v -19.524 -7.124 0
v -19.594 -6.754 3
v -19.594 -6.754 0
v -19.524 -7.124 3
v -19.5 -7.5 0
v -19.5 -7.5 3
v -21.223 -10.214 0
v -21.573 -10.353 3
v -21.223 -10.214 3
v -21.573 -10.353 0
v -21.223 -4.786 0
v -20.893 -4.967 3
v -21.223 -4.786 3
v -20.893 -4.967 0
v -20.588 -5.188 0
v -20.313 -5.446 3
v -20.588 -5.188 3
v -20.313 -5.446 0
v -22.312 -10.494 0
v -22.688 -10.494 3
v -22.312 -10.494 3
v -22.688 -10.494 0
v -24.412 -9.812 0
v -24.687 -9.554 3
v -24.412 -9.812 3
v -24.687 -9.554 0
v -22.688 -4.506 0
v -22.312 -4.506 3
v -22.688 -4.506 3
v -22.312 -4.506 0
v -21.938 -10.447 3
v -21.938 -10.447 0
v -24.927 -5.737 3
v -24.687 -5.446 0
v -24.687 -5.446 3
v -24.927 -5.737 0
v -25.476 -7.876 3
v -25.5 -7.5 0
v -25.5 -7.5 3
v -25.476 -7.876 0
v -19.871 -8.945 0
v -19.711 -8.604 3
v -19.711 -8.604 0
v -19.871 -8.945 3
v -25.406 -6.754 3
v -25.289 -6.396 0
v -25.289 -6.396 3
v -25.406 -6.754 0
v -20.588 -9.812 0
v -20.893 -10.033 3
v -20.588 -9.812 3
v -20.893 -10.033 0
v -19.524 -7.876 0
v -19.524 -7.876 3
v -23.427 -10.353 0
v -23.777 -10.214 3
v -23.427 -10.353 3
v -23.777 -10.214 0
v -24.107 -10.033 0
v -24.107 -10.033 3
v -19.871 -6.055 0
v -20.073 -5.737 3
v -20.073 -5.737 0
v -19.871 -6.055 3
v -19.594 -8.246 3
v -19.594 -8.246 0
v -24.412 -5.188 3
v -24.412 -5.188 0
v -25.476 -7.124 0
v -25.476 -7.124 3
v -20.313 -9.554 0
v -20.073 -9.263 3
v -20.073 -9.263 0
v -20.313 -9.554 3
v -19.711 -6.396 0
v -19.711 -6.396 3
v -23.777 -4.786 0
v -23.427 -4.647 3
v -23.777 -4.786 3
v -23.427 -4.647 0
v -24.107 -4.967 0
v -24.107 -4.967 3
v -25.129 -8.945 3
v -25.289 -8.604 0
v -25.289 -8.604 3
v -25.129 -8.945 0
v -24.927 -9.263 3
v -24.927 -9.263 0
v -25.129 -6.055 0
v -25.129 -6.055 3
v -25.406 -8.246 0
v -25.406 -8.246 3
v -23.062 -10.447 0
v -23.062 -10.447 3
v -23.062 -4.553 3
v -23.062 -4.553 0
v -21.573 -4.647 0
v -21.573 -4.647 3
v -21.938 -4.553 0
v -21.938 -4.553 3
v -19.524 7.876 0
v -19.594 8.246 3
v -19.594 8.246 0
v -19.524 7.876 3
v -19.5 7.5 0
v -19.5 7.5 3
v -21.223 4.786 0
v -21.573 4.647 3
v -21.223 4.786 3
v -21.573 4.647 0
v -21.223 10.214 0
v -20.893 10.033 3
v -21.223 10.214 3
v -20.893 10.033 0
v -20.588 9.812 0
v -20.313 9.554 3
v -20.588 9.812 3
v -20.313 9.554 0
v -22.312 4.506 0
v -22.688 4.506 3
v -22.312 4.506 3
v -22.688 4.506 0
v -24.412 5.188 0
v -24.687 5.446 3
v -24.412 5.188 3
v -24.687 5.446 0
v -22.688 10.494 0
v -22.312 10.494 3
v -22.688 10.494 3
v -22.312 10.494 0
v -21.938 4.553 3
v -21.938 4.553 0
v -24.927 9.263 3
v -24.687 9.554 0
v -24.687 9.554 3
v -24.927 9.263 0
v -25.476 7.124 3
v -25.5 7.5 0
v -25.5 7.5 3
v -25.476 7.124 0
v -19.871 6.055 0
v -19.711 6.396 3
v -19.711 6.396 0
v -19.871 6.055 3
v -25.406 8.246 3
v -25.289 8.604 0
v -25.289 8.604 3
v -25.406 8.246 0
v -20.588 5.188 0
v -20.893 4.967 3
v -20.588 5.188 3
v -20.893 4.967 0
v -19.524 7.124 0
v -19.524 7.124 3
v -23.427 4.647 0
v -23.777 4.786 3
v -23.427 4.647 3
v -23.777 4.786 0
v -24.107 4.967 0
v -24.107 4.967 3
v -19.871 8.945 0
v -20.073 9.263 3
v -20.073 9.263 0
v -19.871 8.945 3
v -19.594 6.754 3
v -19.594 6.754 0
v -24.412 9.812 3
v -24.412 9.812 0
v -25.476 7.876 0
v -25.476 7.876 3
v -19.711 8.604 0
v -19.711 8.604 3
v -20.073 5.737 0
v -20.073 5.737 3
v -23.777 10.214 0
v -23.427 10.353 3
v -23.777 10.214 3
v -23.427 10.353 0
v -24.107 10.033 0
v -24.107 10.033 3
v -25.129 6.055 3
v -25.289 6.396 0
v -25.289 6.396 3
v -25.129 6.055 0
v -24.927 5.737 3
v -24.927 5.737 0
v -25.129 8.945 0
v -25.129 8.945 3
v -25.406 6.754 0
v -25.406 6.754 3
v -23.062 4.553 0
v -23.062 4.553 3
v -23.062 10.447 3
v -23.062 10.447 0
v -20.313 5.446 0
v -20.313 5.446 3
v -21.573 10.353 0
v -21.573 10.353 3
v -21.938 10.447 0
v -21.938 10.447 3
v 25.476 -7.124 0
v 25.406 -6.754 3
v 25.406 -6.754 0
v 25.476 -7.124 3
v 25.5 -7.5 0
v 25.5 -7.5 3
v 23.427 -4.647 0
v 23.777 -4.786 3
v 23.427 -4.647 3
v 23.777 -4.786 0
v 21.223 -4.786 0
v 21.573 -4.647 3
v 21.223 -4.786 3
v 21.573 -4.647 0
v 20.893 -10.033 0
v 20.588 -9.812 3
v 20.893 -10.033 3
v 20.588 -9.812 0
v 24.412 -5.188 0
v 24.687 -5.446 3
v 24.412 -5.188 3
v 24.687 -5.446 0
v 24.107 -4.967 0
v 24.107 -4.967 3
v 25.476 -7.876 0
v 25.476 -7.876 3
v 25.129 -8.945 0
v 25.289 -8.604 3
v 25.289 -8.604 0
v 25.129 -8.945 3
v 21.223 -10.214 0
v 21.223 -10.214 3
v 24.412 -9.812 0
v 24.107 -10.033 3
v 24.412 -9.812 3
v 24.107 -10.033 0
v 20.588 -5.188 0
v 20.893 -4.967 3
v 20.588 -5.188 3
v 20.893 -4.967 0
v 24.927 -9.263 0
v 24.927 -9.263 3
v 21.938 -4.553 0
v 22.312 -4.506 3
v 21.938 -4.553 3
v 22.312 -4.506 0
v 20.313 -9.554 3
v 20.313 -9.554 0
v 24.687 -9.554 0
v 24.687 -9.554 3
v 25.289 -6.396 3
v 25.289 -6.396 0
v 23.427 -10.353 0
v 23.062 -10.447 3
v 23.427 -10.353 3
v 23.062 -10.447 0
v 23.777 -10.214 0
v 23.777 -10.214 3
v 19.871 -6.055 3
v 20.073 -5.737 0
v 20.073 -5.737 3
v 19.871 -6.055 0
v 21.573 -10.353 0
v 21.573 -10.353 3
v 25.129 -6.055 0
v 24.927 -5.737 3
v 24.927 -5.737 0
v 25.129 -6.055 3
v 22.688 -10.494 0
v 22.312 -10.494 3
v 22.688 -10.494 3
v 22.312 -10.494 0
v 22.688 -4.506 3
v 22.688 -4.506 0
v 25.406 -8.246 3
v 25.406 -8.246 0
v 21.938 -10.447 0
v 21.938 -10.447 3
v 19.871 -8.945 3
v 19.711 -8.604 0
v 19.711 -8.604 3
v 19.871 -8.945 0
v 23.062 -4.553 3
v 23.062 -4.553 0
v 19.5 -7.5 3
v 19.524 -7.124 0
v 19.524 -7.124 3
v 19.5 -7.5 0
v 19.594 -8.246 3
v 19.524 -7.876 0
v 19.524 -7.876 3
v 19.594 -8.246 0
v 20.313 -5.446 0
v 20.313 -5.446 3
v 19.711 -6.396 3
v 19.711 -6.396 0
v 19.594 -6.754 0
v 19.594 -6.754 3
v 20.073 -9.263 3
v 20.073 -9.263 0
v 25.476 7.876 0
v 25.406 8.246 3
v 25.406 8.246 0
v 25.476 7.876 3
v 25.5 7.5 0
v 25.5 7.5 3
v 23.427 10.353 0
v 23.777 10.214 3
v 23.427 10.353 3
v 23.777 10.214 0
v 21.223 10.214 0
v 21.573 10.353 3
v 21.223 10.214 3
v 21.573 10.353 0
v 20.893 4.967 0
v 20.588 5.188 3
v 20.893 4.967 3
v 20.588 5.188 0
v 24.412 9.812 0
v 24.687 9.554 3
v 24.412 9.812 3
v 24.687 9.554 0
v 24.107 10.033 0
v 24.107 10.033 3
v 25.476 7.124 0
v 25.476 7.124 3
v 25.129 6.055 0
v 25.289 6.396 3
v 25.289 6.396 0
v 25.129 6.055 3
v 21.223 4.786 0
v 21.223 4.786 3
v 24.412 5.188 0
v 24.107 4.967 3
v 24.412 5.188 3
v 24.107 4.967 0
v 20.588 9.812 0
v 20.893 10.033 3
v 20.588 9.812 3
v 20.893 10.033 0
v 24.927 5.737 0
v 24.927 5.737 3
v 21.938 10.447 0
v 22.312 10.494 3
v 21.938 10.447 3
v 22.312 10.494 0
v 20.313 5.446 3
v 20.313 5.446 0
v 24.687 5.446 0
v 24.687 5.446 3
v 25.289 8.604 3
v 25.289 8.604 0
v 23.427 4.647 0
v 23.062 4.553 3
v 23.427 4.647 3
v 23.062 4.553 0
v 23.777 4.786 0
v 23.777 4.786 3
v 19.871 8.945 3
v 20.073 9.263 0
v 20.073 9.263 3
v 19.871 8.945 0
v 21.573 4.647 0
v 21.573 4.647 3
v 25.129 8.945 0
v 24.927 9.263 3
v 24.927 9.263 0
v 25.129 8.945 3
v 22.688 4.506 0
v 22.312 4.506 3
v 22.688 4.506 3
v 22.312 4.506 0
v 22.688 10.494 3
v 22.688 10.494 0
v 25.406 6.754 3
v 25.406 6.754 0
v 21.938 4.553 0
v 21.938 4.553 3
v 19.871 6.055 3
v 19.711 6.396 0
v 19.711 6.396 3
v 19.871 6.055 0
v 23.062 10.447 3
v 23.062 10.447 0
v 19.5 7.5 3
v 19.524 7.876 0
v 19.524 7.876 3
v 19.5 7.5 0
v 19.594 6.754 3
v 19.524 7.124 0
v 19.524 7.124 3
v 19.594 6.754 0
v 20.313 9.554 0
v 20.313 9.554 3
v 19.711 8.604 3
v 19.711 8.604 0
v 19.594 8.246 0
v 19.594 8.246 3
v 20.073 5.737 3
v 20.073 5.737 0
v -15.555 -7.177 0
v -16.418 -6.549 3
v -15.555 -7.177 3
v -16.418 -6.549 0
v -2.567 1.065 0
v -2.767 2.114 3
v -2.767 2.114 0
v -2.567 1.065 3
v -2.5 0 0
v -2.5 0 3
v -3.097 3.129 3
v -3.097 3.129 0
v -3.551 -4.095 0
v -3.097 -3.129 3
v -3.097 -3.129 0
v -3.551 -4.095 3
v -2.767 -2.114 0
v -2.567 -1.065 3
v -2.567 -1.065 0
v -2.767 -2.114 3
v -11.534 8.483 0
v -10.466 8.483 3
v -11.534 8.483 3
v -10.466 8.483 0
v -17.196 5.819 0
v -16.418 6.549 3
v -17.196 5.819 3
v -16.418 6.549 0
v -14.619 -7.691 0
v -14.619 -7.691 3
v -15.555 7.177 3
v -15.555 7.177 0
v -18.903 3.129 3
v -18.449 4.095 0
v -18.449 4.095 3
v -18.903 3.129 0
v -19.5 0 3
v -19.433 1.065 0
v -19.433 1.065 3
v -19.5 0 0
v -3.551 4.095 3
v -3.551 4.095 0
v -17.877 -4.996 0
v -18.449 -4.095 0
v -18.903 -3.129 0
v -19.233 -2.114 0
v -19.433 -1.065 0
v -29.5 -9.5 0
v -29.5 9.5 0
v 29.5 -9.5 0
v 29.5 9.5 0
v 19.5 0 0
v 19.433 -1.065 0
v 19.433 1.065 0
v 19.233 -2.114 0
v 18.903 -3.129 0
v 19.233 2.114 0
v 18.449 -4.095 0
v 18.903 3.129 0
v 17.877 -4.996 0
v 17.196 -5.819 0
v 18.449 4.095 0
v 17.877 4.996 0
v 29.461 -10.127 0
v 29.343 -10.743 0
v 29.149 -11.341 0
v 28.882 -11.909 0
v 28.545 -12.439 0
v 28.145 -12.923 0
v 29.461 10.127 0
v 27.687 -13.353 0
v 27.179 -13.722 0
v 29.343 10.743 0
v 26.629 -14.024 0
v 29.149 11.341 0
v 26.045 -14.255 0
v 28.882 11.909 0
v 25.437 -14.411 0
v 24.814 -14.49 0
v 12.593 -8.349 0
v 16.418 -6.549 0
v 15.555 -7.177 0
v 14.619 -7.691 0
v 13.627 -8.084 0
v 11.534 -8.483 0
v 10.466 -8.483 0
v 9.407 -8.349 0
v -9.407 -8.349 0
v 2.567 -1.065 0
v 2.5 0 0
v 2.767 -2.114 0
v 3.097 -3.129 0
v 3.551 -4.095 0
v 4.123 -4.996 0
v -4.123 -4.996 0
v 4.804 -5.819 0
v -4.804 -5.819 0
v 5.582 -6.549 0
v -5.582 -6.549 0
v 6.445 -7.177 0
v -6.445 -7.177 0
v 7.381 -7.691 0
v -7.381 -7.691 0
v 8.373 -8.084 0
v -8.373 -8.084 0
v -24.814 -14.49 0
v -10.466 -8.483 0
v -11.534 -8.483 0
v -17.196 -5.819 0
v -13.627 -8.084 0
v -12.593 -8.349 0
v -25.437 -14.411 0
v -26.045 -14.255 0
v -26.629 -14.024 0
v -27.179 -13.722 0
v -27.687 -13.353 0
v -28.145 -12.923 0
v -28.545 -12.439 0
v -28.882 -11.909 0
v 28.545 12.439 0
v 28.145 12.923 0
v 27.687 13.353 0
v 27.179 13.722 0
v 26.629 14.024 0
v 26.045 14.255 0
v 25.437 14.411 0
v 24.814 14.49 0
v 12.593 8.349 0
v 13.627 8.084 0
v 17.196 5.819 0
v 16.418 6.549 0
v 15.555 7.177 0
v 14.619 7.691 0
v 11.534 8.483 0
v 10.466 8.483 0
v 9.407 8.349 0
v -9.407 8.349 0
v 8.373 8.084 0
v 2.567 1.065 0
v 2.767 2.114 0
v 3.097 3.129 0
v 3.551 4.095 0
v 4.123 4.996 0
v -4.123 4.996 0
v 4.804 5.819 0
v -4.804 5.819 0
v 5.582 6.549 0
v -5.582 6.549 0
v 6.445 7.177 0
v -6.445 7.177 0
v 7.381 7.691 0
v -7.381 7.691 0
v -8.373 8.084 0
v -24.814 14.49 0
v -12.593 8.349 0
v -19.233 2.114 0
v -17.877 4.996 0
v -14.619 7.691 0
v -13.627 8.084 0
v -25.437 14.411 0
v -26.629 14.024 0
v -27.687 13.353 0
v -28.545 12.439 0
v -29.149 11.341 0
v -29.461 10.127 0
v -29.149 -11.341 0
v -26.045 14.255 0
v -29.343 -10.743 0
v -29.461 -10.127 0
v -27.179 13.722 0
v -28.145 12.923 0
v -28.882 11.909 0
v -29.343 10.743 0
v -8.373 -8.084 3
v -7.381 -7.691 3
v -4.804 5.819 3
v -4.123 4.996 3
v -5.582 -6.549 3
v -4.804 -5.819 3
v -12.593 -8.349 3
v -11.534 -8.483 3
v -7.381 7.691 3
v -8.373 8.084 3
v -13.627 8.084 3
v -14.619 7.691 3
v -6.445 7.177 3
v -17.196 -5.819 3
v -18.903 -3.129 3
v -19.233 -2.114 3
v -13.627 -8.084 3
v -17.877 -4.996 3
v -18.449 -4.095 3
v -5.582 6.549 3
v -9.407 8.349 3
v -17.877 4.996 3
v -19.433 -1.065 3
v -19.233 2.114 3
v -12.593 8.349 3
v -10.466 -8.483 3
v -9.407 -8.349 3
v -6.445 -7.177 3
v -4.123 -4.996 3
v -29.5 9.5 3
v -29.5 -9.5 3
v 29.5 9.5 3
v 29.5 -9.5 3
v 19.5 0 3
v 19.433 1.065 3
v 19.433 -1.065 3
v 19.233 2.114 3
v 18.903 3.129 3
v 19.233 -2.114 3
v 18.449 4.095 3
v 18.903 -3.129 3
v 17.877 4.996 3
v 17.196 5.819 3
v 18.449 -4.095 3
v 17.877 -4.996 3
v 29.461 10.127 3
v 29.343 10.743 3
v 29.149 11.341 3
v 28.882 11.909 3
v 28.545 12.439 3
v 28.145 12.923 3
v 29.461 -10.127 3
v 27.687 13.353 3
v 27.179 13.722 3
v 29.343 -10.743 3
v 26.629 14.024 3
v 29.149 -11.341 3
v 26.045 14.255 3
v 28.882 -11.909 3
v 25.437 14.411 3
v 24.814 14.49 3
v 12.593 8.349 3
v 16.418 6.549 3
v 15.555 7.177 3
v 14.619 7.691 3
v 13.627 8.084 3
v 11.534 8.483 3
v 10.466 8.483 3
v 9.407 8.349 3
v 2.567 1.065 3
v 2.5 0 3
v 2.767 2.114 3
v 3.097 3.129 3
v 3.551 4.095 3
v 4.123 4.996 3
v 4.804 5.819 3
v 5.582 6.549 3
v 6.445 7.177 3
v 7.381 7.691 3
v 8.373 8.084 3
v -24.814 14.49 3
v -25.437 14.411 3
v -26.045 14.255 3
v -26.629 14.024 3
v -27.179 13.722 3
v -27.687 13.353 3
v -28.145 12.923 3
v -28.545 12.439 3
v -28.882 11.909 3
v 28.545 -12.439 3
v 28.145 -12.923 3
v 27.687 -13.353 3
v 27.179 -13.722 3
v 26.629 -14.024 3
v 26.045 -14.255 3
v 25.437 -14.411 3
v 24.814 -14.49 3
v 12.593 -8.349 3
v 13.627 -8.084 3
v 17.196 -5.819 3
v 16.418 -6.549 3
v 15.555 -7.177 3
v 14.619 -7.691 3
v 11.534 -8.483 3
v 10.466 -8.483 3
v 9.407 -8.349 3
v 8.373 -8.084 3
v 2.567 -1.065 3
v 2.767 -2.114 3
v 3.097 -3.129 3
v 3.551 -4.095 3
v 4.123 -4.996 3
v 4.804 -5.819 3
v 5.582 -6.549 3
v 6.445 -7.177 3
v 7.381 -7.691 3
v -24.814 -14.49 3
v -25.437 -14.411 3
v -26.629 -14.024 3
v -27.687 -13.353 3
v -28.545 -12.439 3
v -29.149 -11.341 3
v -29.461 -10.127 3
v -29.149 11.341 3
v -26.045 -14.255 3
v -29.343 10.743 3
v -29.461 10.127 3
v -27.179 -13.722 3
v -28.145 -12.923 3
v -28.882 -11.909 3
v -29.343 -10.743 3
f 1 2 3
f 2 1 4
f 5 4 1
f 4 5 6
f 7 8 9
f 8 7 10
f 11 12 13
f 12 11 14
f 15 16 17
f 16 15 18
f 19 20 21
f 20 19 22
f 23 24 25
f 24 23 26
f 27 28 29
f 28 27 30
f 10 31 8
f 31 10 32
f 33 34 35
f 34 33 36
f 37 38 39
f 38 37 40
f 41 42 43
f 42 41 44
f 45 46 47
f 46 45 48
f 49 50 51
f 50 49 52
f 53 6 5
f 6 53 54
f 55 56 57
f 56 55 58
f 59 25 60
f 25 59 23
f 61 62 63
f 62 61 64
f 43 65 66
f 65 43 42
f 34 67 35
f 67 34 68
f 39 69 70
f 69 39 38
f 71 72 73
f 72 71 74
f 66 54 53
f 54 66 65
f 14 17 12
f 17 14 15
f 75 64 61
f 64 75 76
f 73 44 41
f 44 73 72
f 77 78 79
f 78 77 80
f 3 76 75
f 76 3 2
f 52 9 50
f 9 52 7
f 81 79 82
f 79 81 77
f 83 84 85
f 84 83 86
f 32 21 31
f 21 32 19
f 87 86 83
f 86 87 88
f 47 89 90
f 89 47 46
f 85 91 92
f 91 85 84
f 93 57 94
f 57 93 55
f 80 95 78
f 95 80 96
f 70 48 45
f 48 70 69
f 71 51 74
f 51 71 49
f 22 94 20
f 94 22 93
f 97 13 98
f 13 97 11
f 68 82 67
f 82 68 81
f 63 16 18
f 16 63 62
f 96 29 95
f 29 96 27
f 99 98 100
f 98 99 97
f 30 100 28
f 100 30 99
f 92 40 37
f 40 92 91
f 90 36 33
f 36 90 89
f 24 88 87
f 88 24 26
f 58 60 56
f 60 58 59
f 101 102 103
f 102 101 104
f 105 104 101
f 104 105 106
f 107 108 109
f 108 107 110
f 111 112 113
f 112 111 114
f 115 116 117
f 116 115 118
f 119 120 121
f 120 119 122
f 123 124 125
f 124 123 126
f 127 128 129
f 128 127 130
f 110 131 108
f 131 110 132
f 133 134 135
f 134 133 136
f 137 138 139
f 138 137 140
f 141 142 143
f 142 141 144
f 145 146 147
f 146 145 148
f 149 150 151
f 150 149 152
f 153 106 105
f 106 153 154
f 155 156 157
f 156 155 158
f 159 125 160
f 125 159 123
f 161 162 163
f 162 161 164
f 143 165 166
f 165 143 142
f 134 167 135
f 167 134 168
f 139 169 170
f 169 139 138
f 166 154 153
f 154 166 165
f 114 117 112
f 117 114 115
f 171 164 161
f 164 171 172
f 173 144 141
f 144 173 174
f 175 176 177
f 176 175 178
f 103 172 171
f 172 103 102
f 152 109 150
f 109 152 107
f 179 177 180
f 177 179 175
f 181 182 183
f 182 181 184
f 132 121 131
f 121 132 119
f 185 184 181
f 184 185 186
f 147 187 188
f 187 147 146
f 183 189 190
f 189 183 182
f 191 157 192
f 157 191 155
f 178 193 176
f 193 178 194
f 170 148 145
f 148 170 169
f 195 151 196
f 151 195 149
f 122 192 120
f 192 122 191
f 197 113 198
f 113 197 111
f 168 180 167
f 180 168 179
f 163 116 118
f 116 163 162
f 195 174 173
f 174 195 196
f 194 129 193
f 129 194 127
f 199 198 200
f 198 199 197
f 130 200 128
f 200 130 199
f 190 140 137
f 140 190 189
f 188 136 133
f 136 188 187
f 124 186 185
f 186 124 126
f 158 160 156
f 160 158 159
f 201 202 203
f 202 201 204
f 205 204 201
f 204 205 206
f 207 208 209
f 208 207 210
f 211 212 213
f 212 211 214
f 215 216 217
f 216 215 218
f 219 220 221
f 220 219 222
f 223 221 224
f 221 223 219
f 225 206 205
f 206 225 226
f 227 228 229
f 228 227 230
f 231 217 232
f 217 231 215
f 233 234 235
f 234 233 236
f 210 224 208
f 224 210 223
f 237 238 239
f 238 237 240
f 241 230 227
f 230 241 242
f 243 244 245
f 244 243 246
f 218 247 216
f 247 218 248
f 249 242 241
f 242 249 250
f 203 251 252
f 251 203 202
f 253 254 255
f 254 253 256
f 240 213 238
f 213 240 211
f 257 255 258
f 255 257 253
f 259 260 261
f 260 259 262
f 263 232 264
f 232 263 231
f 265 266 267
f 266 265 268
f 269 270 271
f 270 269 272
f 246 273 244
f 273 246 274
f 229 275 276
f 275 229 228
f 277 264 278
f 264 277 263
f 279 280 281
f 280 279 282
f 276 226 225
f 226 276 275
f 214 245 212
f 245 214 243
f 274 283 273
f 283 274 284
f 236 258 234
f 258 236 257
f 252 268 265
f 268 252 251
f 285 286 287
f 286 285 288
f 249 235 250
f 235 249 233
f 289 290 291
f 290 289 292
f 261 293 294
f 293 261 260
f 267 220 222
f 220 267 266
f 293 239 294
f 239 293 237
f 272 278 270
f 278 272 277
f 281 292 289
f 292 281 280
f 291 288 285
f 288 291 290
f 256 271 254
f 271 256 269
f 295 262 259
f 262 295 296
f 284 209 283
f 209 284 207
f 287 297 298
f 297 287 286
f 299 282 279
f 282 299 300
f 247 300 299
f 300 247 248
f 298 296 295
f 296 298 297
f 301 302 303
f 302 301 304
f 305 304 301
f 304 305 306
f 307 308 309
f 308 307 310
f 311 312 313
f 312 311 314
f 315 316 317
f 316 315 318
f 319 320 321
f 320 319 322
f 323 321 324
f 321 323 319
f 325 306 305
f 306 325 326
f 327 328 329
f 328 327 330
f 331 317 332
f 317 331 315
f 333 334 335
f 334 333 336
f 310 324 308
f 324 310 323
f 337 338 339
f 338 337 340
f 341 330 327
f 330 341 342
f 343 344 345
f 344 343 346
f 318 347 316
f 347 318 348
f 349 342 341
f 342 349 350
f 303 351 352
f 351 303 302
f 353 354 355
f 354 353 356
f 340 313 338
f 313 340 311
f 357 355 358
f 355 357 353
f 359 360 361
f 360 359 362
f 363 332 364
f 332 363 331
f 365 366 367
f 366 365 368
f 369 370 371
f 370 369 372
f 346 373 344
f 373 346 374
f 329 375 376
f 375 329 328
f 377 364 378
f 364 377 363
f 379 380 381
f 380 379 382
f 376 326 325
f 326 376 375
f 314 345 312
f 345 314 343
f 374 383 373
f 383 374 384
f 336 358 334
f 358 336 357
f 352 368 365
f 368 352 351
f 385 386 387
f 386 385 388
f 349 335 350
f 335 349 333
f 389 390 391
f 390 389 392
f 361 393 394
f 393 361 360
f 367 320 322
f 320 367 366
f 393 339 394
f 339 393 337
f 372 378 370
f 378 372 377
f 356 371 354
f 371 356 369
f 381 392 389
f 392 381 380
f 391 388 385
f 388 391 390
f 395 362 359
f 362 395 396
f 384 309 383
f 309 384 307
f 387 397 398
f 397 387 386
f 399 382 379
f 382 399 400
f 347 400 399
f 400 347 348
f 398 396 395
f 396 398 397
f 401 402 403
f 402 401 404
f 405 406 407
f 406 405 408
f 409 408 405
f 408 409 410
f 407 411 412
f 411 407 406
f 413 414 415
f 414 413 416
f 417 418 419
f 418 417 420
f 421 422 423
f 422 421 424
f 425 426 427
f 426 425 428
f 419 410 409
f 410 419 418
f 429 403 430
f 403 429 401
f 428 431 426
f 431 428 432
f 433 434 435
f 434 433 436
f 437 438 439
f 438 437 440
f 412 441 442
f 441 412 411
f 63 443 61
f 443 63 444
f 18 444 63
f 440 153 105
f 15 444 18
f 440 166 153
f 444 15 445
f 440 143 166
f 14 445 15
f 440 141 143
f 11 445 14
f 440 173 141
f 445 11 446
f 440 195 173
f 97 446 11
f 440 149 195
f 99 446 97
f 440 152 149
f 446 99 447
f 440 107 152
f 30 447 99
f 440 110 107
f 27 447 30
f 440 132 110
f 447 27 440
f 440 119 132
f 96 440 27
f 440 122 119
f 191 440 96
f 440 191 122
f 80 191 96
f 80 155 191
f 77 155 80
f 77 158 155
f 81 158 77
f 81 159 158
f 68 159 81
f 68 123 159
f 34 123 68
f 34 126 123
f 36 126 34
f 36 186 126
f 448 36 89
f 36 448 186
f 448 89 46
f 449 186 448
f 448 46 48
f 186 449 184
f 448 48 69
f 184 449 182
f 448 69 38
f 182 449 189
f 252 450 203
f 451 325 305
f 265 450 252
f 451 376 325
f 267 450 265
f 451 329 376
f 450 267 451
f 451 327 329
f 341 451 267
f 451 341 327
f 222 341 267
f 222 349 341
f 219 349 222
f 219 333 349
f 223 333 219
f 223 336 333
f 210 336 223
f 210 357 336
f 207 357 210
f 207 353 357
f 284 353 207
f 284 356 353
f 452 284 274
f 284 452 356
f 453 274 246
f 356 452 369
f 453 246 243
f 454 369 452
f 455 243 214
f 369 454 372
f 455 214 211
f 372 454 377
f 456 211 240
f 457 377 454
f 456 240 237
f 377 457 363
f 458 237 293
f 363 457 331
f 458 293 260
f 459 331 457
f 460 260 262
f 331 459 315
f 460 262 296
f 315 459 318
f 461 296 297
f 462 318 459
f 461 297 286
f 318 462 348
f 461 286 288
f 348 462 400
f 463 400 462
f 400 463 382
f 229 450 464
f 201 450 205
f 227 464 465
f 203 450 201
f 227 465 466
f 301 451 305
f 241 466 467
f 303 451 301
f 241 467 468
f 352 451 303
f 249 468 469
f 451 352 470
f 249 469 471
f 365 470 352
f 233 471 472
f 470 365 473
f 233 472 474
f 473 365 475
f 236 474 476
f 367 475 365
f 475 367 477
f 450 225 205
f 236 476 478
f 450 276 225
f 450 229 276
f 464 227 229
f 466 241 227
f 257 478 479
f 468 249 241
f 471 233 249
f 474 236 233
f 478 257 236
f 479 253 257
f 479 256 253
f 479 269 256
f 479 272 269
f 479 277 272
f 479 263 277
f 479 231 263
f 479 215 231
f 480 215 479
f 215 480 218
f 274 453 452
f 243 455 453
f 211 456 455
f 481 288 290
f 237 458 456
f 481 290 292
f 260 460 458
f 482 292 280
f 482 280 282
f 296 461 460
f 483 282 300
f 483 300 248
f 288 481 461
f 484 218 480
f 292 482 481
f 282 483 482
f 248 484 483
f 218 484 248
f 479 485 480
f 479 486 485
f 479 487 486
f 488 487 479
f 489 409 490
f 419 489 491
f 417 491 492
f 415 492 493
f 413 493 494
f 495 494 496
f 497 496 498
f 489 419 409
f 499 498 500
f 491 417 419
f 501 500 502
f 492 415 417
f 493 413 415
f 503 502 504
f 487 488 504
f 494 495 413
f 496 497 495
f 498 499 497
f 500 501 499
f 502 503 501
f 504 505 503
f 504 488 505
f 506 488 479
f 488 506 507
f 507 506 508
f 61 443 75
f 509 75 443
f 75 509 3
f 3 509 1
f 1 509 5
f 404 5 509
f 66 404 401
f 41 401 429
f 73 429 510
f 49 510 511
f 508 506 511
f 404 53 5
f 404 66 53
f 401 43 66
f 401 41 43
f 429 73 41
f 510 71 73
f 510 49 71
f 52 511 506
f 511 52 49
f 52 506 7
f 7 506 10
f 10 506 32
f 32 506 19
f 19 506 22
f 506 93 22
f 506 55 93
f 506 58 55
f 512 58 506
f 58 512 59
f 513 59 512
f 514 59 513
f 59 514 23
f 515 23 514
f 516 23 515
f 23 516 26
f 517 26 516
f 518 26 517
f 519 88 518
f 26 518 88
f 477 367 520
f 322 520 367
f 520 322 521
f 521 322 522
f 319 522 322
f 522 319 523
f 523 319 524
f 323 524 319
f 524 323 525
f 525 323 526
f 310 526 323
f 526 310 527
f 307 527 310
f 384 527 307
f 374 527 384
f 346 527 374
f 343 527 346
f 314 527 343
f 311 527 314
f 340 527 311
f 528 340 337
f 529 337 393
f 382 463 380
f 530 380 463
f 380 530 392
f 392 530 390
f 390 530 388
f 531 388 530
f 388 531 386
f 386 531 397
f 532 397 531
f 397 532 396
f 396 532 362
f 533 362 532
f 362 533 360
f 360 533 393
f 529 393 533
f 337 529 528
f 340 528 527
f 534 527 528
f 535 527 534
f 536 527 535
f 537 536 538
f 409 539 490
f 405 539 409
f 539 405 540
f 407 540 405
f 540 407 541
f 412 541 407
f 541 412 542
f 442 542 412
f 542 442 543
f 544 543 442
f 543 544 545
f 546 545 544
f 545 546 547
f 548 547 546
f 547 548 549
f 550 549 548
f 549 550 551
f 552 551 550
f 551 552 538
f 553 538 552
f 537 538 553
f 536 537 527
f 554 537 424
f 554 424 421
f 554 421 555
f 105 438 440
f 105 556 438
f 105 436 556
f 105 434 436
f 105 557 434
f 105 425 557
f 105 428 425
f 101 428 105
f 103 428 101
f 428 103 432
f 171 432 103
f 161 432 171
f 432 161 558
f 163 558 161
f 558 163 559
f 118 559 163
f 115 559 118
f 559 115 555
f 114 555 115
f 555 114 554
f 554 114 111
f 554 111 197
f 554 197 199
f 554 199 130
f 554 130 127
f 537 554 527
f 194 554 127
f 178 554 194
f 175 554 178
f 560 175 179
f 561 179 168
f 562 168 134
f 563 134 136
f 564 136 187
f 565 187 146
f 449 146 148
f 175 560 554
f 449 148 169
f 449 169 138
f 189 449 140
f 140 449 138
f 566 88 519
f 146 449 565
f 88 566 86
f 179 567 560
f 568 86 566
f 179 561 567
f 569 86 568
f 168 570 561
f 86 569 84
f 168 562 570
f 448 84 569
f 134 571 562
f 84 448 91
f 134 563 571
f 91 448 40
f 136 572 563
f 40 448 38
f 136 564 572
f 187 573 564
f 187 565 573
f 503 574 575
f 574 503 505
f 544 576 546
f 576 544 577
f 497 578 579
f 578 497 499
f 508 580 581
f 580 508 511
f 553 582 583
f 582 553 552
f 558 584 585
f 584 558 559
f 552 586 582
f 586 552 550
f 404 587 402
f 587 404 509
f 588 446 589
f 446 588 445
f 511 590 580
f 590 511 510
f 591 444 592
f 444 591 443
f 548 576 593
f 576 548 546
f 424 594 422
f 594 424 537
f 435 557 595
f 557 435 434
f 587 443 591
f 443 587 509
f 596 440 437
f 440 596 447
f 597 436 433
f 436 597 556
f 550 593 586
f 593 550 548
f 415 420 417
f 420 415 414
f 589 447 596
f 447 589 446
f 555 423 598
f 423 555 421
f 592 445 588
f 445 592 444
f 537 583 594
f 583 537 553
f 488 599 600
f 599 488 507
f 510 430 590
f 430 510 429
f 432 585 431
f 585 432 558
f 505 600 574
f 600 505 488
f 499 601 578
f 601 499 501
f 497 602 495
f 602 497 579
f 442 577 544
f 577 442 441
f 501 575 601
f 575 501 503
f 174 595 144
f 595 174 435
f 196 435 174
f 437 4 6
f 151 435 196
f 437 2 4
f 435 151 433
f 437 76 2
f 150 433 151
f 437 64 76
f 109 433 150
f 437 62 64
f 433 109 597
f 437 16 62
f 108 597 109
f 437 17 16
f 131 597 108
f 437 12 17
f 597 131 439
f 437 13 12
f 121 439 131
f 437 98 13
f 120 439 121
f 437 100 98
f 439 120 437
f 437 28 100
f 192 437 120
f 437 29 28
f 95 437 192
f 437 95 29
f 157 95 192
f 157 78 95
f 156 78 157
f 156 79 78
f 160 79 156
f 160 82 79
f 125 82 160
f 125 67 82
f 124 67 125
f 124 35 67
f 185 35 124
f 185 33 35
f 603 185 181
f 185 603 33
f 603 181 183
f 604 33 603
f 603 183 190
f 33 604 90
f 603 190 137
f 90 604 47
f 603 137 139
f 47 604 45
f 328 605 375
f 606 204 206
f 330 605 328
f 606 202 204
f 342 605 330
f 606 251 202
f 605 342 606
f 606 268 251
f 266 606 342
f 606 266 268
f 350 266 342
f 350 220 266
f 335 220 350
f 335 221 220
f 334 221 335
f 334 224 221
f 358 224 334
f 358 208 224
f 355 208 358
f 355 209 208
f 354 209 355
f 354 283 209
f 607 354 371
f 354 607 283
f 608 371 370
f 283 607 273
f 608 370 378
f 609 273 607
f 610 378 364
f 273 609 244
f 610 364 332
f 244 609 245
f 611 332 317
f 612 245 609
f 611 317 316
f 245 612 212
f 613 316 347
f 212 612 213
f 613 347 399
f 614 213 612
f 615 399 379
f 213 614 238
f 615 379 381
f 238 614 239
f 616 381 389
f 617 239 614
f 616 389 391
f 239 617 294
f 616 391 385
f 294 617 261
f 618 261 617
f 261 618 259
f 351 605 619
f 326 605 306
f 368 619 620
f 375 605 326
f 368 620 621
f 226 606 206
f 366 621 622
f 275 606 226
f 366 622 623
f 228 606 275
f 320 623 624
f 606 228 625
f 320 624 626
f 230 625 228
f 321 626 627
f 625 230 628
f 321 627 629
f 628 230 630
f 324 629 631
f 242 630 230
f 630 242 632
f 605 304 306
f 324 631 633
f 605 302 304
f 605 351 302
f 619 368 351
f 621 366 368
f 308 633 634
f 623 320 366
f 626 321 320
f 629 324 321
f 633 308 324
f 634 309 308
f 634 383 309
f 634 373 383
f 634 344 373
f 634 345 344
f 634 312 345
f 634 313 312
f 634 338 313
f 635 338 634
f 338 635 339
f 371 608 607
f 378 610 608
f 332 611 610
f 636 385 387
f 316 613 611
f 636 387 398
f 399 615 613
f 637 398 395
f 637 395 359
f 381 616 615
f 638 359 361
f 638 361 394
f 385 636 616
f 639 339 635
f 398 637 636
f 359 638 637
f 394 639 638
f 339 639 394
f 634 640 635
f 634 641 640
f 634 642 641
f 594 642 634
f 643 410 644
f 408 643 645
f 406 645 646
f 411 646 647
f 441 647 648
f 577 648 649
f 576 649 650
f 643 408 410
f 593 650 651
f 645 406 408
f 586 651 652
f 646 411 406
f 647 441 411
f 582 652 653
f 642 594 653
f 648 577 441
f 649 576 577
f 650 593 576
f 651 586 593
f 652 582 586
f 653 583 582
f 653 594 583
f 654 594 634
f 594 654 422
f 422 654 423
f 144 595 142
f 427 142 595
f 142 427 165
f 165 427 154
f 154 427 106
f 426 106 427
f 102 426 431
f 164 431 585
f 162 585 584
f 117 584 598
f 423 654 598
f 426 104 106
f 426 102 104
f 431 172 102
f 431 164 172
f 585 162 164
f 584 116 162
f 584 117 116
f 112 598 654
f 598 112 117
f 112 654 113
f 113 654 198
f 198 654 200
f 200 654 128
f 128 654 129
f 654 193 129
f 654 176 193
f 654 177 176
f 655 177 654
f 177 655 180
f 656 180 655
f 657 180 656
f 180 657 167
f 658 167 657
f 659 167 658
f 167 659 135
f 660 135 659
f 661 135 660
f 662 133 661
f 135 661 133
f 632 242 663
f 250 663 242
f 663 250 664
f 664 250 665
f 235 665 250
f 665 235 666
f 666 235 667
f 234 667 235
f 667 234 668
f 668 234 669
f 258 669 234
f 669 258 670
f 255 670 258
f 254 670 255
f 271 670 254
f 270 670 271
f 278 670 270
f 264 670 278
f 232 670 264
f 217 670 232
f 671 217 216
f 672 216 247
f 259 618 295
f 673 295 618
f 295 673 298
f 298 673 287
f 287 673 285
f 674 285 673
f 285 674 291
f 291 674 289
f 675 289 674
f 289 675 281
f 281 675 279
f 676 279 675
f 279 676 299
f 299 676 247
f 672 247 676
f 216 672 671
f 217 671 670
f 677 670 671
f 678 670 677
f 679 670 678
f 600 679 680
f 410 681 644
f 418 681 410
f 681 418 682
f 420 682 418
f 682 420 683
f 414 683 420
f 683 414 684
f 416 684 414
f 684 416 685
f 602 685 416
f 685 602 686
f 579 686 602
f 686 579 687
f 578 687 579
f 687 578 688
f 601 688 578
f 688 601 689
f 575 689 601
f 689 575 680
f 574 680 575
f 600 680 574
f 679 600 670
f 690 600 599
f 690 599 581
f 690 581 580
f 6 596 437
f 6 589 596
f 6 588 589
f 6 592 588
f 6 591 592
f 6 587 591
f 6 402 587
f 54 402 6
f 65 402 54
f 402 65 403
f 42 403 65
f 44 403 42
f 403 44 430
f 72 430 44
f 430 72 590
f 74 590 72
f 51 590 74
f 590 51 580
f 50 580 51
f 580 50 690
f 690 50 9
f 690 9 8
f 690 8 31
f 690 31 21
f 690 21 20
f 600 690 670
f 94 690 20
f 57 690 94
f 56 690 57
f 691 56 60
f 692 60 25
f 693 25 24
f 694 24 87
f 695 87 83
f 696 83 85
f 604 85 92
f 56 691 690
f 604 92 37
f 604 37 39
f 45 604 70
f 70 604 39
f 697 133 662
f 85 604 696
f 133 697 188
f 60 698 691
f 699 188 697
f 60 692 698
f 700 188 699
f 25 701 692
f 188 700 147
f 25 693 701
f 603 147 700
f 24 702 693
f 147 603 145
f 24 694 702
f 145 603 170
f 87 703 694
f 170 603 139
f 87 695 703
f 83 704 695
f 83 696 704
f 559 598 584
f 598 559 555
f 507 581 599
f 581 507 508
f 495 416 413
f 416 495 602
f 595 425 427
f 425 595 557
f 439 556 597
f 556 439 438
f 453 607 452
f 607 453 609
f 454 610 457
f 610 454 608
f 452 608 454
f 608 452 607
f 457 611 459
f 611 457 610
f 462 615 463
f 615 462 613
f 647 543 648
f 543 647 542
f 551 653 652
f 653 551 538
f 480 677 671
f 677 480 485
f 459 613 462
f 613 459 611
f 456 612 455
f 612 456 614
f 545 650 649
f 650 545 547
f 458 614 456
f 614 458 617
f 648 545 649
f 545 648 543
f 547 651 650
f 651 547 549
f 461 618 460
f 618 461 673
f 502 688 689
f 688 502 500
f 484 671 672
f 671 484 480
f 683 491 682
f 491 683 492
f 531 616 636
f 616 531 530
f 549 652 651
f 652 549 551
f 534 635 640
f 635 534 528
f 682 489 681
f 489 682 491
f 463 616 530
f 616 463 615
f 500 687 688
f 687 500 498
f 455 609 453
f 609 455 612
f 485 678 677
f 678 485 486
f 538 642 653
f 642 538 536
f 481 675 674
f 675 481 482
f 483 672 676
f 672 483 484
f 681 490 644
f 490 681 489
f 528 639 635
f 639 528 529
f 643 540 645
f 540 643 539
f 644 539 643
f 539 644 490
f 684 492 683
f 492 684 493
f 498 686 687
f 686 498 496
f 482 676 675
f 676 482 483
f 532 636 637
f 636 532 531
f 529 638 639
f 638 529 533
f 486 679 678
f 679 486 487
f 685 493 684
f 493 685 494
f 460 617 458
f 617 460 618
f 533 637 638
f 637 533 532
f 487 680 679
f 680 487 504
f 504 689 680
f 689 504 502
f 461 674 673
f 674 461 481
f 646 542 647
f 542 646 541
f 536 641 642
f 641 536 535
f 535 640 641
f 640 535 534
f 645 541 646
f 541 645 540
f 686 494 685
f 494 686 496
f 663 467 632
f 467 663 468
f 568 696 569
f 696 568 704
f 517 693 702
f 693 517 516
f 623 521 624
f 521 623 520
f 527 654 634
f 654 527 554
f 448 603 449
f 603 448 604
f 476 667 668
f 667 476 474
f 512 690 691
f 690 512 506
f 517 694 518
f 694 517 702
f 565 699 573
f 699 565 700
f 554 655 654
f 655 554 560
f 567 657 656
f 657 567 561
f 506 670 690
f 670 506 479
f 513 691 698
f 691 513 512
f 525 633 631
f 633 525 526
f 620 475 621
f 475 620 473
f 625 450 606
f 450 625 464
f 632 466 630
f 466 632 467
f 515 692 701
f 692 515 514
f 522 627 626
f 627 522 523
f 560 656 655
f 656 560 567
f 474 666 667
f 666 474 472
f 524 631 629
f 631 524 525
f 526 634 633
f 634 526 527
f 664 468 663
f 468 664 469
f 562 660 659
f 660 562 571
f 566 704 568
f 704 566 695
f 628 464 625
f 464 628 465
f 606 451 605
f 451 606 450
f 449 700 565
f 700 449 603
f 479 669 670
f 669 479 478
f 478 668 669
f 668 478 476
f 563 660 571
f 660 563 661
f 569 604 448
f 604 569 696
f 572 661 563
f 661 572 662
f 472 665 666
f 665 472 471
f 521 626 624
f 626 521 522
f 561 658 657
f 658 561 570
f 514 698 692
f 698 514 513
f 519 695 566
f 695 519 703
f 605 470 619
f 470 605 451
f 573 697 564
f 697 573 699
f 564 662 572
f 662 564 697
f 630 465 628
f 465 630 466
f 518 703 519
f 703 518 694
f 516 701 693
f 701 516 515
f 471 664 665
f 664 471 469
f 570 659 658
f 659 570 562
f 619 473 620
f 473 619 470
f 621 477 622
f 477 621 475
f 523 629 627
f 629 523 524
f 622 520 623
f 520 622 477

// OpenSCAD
$fn = 50;


difference() {
	union() {
		hull() {
			translate(v = [-24.5000000000, 9.5000000000, 0]) {
				cylinder(h = 3, r = 5);
			}
			translate(v = [24.5000000000, 9.5000000000, 0]) {
				cylinder(h = 3, r = 5);
			}
			translate(v = [-24.5000000000, -9.5000000000, 0]) {
				cylinder(h = 3, r = 5);
			}
			translate(v = [24.5000000000, -9.5000000000, 0]) {
				cylinder(h = 3, r = 5);
			}
		}
	}
	union() {
		#translate(v = [-22.5000000000, -7.5000000000, -100.0000000000]) {
			cylinder(h = 200, r = 3.0000000000);
		}
		#translate(v = [-22.5000000000, 7.5000000000, -100.0000000000]) {
			cylinder(h = 200, r = 3.0000000000);
		}
		#translate(v = [22.5000000000, -7.5000000000, -100.0000000000]) {
			cylinder(h = 200, r = 3.0000000000);
		}
		#translate(v = [22.5000000000, 7.5000000000, -100.0000000000]) {
			cylinder(h = 200, r = 3.0000000000);
		}
		#translate(v = [-11.0000000000, 0, 0]) {
			cylinder(h = 3, r = 8.5000000000);
		}
		#translate(v = [11.0000000000, 0, 0]) {
			cylinder(h = 3, r = 8.5000000000);
		}
	}
}
